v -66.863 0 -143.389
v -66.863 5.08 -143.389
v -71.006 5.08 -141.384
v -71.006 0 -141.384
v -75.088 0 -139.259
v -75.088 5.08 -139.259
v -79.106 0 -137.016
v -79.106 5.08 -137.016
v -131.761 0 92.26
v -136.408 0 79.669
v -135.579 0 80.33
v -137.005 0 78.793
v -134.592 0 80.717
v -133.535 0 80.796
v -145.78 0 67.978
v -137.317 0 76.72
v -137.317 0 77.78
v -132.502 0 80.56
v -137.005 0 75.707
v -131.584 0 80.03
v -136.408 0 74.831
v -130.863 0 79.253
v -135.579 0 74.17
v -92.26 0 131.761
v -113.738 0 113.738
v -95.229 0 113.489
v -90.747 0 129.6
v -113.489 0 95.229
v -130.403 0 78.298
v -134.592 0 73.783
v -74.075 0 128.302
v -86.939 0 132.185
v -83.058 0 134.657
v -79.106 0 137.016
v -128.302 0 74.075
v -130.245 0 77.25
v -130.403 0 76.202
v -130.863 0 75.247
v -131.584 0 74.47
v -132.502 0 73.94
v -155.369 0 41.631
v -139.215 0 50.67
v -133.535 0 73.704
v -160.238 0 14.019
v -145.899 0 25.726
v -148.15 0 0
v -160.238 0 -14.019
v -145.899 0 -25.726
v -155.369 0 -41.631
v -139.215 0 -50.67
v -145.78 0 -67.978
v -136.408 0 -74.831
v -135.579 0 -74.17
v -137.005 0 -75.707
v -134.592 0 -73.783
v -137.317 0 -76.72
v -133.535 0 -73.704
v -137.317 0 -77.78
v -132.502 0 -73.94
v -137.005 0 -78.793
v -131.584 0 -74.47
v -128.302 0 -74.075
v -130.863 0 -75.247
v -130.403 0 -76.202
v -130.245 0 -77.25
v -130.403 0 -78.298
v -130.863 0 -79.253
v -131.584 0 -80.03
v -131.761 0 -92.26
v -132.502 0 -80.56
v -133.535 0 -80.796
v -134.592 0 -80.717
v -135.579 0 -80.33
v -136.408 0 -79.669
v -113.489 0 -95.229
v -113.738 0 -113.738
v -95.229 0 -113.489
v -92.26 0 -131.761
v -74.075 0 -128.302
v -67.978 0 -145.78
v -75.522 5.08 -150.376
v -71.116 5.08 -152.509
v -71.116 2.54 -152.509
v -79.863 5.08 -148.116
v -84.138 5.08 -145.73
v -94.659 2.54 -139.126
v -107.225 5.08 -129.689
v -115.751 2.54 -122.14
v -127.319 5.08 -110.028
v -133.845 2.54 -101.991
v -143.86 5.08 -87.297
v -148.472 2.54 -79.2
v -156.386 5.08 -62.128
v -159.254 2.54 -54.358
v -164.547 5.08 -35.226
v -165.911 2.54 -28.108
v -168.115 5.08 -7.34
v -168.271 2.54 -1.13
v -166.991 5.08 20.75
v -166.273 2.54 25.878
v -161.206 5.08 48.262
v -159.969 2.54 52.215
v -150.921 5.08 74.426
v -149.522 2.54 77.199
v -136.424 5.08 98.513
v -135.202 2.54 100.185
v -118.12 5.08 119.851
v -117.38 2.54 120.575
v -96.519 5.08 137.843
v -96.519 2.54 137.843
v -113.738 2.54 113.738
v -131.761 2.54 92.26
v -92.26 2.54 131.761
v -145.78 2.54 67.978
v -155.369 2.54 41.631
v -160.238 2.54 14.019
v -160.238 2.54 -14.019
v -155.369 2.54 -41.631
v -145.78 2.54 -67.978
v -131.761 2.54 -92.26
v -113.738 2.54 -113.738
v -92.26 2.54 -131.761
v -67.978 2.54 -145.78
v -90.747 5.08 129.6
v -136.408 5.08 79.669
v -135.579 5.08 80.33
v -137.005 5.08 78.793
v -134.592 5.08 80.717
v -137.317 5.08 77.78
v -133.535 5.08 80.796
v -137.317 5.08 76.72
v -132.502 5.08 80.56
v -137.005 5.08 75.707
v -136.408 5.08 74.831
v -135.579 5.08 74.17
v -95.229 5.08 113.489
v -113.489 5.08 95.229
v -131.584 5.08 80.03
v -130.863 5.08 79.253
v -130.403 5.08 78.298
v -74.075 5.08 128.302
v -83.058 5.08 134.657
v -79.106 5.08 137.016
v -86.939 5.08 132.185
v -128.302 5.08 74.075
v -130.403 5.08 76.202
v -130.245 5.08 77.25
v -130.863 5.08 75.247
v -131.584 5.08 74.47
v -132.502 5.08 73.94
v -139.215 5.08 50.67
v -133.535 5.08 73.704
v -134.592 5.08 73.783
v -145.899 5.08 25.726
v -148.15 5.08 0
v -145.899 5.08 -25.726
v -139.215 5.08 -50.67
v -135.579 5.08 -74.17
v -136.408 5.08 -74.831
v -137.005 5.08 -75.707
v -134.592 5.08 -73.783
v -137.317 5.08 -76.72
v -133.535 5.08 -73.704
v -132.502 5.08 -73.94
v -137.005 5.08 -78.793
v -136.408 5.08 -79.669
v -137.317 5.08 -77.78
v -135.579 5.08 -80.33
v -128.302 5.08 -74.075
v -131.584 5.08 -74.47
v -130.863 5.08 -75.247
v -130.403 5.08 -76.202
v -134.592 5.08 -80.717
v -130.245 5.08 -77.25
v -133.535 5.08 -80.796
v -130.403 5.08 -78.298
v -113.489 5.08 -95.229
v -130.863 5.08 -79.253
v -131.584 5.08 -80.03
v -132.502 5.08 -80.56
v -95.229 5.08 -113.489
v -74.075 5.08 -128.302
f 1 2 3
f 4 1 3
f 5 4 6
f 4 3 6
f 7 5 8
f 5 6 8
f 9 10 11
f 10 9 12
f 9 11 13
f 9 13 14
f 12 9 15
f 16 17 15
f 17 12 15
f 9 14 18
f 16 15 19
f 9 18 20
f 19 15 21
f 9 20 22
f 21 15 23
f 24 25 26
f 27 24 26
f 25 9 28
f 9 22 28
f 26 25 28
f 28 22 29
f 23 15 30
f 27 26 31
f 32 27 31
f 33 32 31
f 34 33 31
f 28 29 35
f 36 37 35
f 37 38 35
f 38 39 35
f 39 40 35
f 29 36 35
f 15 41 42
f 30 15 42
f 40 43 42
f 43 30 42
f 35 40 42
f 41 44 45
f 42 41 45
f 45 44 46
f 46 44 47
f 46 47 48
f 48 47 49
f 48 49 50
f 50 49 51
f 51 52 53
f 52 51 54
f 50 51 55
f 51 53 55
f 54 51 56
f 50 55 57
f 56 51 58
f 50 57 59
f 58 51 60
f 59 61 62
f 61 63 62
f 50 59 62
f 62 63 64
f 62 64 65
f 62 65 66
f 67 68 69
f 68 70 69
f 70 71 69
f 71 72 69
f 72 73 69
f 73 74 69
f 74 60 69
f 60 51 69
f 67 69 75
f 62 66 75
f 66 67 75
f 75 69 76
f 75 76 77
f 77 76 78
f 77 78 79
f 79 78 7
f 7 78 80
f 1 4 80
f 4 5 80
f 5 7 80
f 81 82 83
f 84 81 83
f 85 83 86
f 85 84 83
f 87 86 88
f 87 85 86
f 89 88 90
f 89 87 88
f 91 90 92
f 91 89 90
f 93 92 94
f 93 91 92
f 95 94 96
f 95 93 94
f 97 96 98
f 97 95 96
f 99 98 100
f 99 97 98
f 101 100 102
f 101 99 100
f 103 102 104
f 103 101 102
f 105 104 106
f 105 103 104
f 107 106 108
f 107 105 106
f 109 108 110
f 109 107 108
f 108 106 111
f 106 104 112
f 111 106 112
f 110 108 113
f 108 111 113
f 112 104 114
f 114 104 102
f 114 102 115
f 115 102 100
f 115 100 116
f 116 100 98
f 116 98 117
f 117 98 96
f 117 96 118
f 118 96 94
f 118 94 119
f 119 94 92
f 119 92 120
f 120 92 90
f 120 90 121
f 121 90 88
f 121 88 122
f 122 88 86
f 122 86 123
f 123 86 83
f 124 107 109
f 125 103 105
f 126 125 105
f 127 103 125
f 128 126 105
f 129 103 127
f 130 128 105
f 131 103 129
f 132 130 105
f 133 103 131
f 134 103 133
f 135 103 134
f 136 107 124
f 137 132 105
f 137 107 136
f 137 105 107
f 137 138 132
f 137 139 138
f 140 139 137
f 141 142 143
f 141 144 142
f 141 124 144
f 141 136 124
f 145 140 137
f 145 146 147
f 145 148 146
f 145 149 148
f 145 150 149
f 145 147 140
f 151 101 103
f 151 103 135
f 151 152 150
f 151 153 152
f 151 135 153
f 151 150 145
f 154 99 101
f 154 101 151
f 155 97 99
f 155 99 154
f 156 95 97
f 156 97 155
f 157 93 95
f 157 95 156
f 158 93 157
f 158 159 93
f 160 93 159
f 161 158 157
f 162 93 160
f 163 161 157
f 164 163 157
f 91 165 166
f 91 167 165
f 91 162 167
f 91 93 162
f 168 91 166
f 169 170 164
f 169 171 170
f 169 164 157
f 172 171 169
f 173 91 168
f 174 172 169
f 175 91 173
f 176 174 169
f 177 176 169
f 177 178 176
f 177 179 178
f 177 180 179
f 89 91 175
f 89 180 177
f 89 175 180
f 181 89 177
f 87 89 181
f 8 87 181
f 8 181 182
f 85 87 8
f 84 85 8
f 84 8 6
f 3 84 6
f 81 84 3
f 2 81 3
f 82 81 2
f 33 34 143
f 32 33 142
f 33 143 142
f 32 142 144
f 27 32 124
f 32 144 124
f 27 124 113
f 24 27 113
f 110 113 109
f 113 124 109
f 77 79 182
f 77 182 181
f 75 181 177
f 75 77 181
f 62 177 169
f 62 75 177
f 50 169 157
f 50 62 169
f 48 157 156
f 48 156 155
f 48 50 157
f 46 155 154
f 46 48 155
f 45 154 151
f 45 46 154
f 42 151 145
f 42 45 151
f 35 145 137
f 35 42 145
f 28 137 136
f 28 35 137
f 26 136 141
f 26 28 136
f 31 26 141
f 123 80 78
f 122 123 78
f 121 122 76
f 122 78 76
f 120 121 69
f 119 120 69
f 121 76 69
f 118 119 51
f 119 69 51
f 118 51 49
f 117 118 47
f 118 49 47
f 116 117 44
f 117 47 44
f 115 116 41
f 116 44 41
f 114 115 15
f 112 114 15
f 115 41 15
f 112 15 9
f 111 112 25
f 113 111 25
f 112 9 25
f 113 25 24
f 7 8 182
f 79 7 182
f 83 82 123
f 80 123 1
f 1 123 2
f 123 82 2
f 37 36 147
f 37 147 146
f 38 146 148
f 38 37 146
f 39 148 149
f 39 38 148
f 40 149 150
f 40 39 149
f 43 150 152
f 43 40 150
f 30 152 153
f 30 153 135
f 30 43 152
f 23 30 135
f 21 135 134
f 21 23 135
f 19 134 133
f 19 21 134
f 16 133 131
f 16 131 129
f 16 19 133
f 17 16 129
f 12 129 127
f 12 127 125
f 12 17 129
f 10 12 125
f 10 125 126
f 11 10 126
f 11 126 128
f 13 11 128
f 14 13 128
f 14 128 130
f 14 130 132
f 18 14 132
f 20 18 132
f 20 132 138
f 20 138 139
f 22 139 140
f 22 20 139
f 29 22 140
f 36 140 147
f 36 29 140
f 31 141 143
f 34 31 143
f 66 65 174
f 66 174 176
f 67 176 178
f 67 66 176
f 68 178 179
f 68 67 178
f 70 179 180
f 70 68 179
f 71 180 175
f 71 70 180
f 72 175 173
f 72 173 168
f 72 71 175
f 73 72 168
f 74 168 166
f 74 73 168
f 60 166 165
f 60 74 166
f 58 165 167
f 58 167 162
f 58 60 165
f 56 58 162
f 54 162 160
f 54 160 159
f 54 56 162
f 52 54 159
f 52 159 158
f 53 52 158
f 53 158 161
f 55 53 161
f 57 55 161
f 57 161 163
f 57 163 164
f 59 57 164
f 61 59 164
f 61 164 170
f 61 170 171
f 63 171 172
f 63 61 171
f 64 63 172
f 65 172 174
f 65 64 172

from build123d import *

# Parameters (mm, degrees)
SKETCH1_R           = 160.85
SKETCH1_R_2         = 3.556
SKETCH1_R_3         = 148.15
BOSS_EXTRUDE1_DEPTH = 5.08
SKETCH2_R           = 168.275
SKETCH2_R_2         = 160.85
BOSS_EXTRUDE2_DEPTH = 2.54
CUT_EXTRUDE1_DEPTH  = 6.08


with BuildPart() as part:
    # Sketch1 → Boss-Extrude1 (new body)
    with BuildSketch(Plane(origin=(0, 0, 0), x_dir=(1, 0, 0), z_dir=(0, 1, 0))):
        Circle(SKETCH1_R)
        with Locations((0, 154.5)):
            Circle(SKETCH1_R_2, mode=Mode.SUBTRACT)
        with Locations((133.800924885, 77.25)):
            Circle(SKETCH1_R_2, mode=Mode.SUBTRACT)
        with Locations((133.800924885, -77.25)):
            Circle(SKETCH1_R_2, mode=Mode.SUBTRACT)
        with Locations((0, -154.5)):
            Circle(SKETCH1_R_2, mode=Mode.SUBTRACT)
        with Locations((-133.800924885, -77.25)):
            Circle(SKETCH1_R_2, mode=Mode.SUBTRACT)
        with Locations((-133.800924885, 77.25)):
            Circle(SKETCH1_R_2, mode=Mode.SUBTRACT)
        Circle(SKETCH1_R_3, mode=Mode.SUBTRACT)
    extrude(amount=BOSS_EXTRUDE1_DEPTH)

    # Sketch2 → Boss-Extrude2 (add)
    with BuildSketch(Plane(origin=(0, 5.08, 0), x_dir=(1, 0, 0), z_dir=(0, 1, 0))):
        Circle(SKETCH2_R)
        Circle(SKETCH2_R_2, mode=Mode.SUBTRACT)
    extrude(amount=-BOSS_EXTRUDE2_DEPTH)

    # Sketch3 → Cut-Extrude1 (cut, through all)
    with BuildSketch(Plane(origin=(0, 5.08, 0), x_dir=(1, 0, 0), z_dir=(0, 1, 0))):
        with BuildLine():
            Line((-88.9, 153.979316793), (-84.1375, 145.730424822))
            ThreePointArc((-84.1375, 145.730424822), (-77.700747892, 149.261747953), (-71.116087994, 152.508942864))
            Line((-71.116087994, 152.508942864), (-66.863491736, 143.389220757))
            ThreePointArc((-66.863491736, 143.389220757), (-73.054402471, 140.336201444), (-79.10625, 137.016044196))
            Line((-79.10625, 137.016044196), (0, 0))
            Line((0, 0), (-79.10625, -137.016044196))
            ThreePointArc((-79.10625, -137.016044196), (-85.007514286, -133.435069121), (-90.746961936, -129.600092807))
            Line((-90.746961936, -129.600092807), (-96.518574827, -137.842810253))
            ThreePointArc((-96.518574827, -137.842810253), (-90.414091595, -141.921695544), (-84.1375, -145.730424822))
            Line((-84.1375, -145.730424822), (-88.9, -153.979316793))
            ThreePointArc((-88.9, -153.979316793), (177.8, 0), (-88.9, 153.979316793))
        make_face()
    extrude(amount=-CUT_EXTRUDE1_DEPTH, mode=Mode.SUBTRACT)


solid = part.part
